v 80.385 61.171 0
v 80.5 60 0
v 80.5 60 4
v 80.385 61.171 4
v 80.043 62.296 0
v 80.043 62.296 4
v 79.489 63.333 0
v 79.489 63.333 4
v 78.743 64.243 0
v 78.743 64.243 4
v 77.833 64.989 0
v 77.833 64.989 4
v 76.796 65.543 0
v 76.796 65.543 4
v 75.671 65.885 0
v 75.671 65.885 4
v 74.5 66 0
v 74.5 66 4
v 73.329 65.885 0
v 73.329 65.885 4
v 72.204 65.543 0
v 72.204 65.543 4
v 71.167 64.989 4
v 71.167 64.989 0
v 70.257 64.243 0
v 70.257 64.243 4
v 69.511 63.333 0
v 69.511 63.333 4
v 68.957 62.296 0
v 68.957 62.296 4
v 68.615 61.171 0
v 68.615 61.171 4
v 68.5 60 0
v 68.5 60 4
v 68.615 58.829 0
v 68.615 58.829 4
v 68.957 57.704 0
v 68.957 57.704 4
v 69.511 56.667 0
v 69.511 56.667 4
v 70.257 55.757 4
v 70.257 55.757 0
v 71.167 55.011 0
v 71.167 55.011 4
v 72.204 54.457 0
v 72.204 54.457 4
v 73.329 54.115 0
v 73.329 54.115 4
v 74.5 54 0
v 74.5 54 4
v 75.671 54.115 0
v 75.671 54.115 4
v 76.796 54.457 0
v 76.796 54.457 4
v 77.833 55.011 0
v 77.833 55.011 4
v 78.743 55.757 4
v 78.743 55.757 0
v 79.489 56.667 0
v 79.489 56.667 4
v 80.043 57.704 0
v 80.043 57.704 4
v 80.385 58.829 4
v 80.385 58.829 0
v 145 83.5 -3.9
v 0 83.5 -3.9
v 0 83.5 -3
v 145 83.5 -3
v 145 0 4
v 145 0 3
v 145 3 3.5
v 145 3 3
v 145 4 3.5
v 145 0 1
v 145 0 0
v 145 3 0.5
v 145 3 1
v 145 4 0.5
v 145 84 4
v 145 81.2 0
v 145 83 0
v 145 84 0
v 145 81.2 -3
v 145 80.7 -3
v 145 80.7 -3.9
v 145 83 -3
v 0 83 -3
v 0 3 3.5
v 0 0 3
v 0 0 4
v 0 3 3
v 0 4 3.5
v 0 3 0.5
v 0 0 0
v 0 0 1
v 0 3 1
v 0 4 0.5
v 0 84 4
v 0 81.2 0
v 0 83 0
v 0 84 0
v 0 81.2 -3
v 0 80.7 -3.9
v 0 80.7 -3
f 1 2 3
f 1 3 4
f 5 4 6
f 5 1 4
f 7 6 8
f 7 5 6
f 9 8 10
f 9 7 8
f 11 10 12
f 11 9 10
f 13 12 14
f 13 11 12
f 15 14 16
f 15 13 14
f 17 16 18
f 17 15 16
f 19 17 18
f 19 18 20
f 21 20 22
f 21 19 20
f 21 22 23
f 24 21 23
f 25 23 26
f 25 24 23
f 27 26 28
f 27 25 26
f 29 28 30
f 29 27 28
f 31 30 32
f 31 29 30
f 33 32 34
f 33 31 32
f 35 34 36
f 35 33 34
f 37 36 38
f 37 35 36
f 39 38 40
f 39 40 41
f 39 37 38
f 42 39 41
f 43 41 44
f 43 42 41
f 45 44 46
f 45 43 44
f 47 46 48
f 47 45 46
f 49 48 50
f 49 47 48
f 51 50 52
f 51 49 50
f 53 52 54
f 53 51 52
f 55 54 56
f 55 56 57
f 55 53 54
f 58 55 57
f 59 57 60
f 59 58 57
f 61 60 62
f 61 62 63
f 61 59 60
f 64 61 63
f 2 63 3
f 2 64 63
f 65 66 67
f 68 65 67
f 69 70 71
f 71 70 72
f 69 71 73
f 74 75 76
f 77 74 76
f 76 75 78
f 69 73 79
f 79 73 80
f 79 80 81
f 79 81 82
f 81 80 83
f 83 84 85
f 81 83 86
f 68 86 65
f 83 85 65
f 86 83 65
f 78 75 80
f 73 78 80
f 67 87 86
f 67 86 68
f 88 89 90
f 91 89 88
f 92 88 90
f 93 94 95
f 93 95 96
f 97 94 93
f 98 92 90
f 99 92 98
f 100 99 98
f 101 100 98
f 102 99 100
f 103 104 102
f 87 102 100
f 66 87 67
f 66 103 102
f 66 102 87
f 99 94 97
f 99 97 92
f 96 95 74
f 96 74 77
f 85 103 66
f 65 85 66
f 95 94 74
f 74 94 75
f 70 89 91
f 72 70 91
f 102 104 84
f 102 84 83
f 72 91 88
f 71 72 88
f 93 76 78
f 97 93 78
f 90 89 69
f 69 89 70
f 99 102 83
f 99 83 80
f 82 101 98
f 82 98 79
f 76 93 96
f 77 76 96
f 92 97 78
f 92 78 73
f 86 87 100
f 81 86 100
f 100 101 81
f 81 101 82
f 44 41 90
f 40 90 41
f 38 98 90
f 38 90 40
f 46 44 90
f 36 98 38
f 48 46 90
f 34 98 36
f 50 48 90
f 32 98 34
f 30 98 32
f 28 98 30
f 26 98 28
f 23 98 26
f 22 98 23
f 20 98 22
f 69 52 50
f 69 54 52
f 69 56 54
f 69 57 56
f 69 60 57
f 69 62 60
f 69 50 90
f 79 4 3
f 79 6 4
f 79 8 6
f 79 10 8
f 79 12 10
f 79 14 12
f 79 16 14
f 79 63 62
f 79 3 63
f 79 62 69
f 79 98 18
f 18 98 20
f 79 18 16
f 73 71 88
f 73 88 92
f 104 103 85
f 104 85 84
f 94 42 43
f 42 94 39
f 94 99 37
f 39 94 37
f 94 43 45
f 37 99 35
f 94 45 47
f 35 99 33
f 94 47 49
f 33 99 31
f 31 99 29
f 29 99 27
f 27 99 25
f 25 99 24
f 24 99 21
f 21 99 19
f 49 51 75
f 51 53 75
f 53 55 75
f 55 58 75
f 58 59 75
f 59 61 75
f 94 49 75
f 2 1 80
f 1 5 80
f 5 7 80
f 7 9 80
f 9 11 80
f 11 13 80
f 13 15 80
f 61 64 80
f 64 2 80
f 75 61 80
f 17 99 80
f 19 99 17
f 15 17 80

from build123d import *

# Parameters (mm, degrees)
SKETCH150_W     = 145
SKETCH150_H     = 84
SKETCH150_R     = 6
PAD073_DEPTH    = 4
SKETCH179_W     = 1.8
SKETCH179_H     = 3
SKETCH179_W_2   = 2.8
SKETCH179_H_2   = 0.9
PAD084_DEPTH    = 145
SKETCH184_W     = 3
SKETCH184_H     = 2
SKETCH184_W_2   = 1
SKETCH184_H_2   = 3
POCKET108_DEPTH = 145


with BuildPart() as part:
    # Sketch150 → Pad073 (new body)
    with BuildSketch(Plane.XY):
        with Locations((72.5, 42)):
            Rectangle(SKETCH150_W, SKETCH150_H)
        with Locations((74.5, 60)):
            Circle(SKETCH150_R, mode=Mode.SUBTRACT)
    extrude(amount=PAD073_DEPTH)

    # Sketch179 → Pad084 (join)
    with BuildSketch(Plane.YZ):
        with Locations((82.1, -1.5)):
            Rectangle(SKETCH179_W, SKETCH179_H)
        with Locations((82.1, -3.45)):
            Rectangle(SKETCH179_W_2, SKETCH179_H_2)
    extrude(amount=PAD084_DEPTH)

    # Sketch184 → Pocket108 (cut)
    with BuildSketch(Plane.YZ):
        with Locations((1.5, 2)):
            Rectangle(SKETCH184_W, SKETCH184_H)
        with Locations((3.5, 2)):
            Rectangle(SKETCH184_W_2, SKETCH184_H_2)
    extrude(amount=POCKET108_DEPTH, mode=Mode.SUBTRACT)


solid = part.part
